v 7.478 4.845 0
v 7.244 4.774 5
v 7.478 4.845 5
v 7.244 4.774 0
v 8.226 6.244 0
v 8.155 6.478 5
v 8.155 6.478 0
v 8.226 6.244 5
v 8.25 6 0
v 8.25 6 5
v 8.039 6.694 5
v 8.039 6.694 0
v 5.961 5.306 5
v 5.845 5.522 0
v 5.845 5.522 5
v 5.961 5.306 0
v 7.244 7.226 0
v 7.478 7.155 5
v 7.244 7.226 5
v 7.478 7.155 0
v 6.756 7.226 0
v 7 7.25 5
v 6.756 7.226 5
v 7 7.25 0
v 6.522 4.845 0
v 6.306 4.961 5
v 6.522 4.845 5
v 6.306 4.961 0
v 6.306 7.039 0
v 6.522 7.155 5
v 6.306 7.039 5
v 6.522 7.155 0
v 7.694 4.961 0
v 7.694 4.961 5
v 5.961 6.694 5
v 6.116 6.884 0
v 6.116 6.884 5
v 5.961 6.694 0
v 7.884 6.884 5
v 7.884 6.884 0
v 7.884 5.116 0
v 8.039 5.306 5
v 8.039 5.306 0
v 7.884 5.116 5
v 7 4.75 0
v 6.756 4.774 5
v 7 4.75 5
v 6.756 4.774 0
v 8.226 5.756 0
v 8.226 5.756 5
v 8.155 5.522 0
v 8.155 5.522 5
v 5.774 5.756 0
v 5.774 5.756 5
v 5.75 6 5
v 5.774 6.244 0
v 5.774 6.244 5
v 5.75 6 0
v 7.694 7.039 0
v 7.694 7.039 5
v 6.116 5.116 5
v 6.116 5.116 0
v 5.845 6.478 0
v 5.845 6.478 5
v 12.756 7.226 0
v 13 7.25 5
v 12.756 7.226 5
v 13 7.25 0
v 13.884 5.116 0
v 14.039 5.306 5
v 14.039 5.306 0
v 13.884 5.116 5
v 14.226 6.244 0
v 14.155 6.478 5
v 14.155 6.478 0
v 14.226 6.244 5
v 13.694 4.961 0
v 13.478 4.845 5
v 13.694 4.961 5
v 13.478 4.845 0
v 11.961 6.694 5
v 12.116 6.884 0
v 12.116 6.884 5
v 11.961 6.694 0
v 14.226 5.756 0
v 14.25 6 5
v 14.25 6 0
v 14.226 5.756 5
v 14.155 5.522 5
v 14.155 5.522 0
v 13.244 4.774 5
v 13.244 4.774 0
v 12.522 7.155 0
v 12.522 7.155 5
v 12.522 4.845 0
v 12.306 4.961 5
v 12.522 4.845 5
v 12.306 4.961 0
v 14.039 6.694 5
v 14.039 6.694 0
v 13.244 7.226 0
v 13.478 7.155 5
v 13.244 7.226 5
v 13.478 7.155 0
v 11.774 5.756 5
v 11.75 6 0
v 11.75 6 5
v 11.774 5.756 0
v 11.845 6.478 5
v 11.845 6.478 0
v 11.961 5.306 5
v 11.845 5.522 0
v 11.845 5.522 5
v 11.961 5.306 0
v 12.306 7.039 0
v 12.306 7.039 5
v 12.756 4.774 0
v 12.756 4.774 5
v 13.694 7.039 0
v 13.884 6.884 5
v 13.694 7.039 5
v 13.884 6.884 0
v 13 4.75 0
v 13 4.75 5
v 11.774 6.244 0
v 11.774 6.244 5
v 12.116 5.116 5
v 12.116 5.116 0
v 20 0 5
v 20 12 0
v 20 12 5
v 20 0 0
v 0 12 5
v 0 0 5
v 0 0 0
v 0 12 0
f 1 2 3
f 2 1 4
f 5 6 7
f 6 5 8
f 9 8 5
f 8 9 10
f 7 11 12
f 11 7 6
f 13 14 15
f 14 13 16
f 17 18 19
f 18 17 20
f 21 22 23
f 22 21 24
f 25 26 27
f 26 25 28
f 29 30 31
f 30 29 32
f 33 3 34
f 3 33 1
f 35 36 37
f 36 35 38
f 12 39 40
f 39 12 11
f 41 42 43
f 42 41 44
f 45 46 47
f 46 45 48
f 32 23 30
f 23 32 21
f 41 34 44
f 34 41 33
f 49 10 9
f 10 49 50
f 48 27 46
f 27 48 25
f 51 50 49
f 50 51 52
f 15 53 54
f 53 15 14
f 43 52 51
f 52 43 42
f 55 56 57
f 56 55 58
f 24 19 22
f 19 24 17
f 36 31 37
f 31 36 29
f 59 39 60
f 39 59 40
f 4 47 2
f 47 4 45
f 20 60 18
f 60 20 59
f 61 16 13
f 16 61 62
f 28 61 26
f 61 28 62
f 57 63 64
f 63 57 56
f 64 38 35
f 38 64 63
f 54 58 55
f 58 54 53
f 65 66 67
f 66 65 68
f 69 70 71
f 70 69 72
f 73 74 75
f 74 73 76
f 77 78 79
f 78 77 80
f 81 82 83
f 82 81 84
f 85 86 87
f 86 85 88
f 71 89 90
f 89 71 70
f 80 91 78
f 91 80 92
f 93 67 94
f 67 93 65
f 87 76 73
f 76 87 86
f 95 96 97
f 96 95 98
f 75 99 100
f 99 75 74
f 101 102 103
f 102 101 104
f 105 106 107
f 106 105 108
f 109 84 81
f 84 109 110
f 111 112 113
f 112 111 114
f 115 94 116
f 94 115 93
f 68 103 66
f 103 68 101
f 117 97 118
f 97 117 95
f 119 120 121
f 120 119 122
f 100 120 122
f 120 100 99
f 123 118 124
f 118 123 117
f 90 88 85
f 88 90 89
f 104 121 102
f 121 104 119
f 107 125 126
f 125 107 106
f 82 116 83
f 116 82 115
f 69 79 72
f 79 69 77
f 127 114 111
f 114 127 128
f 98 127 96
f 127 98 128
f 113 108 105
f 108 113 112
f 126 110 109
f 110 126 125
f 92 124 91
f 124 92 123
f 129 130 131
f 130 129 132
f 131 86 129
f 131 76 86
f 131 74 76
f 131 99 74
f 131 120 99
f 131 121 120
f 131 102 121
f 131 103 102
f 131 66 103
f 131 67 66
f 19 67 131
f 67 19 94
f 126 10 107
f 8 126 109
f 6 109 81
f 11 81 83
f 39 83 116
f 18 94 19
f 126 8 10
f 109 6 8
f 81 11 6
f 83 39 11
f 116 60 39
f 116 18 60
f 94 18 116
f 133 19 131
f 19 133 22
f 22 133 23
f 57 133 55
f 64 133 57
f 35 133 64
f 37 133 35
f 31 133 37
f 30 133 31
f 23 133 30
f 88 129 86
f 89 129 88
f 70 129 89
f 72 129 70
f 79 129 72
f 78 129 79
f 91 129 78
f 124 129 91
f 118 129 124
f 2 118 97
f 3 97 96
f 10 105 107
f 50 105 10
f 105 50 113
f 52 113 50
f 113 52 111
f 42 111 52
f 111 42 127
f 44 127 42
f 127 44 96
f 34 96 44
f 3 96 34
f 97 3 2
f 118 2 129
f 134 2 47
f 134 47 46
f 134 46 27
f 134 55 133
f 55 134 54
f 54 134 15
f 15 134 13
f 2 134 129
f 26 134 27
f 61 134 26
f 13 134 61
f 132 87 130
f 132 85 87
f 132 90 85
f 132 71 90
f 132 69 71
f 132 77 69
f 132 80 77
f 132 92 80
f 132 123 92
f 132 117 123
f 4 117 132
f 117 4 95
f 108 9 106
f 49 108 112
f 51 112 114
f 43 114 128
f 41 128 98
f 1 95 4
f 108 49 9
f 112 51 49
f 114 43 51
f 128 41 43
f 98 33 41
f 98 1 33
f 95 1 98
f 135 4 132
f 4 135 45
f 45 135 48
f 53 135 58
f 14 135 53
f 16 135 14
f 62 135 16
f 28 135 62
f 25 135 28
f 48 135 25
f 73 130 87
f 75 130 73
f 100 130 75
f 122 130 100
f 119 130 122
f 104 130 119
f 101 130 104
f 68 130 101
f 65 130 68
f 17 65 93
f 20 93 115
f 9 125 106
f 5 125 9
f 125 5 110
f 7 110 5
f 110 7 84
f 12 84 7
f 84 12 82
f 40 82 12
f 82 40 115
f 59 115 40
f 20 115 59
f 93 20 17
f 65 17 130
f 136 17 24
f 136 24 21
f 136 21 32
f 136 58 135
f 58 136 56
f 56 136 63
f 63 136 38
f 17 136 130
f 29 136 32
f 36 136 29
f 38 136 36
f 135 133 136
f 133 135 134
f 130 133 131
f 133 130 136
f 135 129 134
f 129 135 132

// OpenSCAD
$fn = 32;

// ----------------------------------------------------------------------
// Micro pad: two-hole pad, 5-20 mm class
// ----------------------------------------------------------------------

// --- parameters (mm) ---
pad_l = 20;               // pad length, X
pad_w = 12;               // pad width, Y
pad_t = 5;                // pad thickness, Z
hole_d = 2.5;             // hole diameter
hole_x = 7;               // X of the first hole centre

difference() {
  cube([pad_l, pad_w, pad_t]);
  for (x = [hole_x, pad_l - hole_x])
    translate([x, pad_w / 2, -1])
      cylinder(h = pad_t + 2, d = hole_d);
}
